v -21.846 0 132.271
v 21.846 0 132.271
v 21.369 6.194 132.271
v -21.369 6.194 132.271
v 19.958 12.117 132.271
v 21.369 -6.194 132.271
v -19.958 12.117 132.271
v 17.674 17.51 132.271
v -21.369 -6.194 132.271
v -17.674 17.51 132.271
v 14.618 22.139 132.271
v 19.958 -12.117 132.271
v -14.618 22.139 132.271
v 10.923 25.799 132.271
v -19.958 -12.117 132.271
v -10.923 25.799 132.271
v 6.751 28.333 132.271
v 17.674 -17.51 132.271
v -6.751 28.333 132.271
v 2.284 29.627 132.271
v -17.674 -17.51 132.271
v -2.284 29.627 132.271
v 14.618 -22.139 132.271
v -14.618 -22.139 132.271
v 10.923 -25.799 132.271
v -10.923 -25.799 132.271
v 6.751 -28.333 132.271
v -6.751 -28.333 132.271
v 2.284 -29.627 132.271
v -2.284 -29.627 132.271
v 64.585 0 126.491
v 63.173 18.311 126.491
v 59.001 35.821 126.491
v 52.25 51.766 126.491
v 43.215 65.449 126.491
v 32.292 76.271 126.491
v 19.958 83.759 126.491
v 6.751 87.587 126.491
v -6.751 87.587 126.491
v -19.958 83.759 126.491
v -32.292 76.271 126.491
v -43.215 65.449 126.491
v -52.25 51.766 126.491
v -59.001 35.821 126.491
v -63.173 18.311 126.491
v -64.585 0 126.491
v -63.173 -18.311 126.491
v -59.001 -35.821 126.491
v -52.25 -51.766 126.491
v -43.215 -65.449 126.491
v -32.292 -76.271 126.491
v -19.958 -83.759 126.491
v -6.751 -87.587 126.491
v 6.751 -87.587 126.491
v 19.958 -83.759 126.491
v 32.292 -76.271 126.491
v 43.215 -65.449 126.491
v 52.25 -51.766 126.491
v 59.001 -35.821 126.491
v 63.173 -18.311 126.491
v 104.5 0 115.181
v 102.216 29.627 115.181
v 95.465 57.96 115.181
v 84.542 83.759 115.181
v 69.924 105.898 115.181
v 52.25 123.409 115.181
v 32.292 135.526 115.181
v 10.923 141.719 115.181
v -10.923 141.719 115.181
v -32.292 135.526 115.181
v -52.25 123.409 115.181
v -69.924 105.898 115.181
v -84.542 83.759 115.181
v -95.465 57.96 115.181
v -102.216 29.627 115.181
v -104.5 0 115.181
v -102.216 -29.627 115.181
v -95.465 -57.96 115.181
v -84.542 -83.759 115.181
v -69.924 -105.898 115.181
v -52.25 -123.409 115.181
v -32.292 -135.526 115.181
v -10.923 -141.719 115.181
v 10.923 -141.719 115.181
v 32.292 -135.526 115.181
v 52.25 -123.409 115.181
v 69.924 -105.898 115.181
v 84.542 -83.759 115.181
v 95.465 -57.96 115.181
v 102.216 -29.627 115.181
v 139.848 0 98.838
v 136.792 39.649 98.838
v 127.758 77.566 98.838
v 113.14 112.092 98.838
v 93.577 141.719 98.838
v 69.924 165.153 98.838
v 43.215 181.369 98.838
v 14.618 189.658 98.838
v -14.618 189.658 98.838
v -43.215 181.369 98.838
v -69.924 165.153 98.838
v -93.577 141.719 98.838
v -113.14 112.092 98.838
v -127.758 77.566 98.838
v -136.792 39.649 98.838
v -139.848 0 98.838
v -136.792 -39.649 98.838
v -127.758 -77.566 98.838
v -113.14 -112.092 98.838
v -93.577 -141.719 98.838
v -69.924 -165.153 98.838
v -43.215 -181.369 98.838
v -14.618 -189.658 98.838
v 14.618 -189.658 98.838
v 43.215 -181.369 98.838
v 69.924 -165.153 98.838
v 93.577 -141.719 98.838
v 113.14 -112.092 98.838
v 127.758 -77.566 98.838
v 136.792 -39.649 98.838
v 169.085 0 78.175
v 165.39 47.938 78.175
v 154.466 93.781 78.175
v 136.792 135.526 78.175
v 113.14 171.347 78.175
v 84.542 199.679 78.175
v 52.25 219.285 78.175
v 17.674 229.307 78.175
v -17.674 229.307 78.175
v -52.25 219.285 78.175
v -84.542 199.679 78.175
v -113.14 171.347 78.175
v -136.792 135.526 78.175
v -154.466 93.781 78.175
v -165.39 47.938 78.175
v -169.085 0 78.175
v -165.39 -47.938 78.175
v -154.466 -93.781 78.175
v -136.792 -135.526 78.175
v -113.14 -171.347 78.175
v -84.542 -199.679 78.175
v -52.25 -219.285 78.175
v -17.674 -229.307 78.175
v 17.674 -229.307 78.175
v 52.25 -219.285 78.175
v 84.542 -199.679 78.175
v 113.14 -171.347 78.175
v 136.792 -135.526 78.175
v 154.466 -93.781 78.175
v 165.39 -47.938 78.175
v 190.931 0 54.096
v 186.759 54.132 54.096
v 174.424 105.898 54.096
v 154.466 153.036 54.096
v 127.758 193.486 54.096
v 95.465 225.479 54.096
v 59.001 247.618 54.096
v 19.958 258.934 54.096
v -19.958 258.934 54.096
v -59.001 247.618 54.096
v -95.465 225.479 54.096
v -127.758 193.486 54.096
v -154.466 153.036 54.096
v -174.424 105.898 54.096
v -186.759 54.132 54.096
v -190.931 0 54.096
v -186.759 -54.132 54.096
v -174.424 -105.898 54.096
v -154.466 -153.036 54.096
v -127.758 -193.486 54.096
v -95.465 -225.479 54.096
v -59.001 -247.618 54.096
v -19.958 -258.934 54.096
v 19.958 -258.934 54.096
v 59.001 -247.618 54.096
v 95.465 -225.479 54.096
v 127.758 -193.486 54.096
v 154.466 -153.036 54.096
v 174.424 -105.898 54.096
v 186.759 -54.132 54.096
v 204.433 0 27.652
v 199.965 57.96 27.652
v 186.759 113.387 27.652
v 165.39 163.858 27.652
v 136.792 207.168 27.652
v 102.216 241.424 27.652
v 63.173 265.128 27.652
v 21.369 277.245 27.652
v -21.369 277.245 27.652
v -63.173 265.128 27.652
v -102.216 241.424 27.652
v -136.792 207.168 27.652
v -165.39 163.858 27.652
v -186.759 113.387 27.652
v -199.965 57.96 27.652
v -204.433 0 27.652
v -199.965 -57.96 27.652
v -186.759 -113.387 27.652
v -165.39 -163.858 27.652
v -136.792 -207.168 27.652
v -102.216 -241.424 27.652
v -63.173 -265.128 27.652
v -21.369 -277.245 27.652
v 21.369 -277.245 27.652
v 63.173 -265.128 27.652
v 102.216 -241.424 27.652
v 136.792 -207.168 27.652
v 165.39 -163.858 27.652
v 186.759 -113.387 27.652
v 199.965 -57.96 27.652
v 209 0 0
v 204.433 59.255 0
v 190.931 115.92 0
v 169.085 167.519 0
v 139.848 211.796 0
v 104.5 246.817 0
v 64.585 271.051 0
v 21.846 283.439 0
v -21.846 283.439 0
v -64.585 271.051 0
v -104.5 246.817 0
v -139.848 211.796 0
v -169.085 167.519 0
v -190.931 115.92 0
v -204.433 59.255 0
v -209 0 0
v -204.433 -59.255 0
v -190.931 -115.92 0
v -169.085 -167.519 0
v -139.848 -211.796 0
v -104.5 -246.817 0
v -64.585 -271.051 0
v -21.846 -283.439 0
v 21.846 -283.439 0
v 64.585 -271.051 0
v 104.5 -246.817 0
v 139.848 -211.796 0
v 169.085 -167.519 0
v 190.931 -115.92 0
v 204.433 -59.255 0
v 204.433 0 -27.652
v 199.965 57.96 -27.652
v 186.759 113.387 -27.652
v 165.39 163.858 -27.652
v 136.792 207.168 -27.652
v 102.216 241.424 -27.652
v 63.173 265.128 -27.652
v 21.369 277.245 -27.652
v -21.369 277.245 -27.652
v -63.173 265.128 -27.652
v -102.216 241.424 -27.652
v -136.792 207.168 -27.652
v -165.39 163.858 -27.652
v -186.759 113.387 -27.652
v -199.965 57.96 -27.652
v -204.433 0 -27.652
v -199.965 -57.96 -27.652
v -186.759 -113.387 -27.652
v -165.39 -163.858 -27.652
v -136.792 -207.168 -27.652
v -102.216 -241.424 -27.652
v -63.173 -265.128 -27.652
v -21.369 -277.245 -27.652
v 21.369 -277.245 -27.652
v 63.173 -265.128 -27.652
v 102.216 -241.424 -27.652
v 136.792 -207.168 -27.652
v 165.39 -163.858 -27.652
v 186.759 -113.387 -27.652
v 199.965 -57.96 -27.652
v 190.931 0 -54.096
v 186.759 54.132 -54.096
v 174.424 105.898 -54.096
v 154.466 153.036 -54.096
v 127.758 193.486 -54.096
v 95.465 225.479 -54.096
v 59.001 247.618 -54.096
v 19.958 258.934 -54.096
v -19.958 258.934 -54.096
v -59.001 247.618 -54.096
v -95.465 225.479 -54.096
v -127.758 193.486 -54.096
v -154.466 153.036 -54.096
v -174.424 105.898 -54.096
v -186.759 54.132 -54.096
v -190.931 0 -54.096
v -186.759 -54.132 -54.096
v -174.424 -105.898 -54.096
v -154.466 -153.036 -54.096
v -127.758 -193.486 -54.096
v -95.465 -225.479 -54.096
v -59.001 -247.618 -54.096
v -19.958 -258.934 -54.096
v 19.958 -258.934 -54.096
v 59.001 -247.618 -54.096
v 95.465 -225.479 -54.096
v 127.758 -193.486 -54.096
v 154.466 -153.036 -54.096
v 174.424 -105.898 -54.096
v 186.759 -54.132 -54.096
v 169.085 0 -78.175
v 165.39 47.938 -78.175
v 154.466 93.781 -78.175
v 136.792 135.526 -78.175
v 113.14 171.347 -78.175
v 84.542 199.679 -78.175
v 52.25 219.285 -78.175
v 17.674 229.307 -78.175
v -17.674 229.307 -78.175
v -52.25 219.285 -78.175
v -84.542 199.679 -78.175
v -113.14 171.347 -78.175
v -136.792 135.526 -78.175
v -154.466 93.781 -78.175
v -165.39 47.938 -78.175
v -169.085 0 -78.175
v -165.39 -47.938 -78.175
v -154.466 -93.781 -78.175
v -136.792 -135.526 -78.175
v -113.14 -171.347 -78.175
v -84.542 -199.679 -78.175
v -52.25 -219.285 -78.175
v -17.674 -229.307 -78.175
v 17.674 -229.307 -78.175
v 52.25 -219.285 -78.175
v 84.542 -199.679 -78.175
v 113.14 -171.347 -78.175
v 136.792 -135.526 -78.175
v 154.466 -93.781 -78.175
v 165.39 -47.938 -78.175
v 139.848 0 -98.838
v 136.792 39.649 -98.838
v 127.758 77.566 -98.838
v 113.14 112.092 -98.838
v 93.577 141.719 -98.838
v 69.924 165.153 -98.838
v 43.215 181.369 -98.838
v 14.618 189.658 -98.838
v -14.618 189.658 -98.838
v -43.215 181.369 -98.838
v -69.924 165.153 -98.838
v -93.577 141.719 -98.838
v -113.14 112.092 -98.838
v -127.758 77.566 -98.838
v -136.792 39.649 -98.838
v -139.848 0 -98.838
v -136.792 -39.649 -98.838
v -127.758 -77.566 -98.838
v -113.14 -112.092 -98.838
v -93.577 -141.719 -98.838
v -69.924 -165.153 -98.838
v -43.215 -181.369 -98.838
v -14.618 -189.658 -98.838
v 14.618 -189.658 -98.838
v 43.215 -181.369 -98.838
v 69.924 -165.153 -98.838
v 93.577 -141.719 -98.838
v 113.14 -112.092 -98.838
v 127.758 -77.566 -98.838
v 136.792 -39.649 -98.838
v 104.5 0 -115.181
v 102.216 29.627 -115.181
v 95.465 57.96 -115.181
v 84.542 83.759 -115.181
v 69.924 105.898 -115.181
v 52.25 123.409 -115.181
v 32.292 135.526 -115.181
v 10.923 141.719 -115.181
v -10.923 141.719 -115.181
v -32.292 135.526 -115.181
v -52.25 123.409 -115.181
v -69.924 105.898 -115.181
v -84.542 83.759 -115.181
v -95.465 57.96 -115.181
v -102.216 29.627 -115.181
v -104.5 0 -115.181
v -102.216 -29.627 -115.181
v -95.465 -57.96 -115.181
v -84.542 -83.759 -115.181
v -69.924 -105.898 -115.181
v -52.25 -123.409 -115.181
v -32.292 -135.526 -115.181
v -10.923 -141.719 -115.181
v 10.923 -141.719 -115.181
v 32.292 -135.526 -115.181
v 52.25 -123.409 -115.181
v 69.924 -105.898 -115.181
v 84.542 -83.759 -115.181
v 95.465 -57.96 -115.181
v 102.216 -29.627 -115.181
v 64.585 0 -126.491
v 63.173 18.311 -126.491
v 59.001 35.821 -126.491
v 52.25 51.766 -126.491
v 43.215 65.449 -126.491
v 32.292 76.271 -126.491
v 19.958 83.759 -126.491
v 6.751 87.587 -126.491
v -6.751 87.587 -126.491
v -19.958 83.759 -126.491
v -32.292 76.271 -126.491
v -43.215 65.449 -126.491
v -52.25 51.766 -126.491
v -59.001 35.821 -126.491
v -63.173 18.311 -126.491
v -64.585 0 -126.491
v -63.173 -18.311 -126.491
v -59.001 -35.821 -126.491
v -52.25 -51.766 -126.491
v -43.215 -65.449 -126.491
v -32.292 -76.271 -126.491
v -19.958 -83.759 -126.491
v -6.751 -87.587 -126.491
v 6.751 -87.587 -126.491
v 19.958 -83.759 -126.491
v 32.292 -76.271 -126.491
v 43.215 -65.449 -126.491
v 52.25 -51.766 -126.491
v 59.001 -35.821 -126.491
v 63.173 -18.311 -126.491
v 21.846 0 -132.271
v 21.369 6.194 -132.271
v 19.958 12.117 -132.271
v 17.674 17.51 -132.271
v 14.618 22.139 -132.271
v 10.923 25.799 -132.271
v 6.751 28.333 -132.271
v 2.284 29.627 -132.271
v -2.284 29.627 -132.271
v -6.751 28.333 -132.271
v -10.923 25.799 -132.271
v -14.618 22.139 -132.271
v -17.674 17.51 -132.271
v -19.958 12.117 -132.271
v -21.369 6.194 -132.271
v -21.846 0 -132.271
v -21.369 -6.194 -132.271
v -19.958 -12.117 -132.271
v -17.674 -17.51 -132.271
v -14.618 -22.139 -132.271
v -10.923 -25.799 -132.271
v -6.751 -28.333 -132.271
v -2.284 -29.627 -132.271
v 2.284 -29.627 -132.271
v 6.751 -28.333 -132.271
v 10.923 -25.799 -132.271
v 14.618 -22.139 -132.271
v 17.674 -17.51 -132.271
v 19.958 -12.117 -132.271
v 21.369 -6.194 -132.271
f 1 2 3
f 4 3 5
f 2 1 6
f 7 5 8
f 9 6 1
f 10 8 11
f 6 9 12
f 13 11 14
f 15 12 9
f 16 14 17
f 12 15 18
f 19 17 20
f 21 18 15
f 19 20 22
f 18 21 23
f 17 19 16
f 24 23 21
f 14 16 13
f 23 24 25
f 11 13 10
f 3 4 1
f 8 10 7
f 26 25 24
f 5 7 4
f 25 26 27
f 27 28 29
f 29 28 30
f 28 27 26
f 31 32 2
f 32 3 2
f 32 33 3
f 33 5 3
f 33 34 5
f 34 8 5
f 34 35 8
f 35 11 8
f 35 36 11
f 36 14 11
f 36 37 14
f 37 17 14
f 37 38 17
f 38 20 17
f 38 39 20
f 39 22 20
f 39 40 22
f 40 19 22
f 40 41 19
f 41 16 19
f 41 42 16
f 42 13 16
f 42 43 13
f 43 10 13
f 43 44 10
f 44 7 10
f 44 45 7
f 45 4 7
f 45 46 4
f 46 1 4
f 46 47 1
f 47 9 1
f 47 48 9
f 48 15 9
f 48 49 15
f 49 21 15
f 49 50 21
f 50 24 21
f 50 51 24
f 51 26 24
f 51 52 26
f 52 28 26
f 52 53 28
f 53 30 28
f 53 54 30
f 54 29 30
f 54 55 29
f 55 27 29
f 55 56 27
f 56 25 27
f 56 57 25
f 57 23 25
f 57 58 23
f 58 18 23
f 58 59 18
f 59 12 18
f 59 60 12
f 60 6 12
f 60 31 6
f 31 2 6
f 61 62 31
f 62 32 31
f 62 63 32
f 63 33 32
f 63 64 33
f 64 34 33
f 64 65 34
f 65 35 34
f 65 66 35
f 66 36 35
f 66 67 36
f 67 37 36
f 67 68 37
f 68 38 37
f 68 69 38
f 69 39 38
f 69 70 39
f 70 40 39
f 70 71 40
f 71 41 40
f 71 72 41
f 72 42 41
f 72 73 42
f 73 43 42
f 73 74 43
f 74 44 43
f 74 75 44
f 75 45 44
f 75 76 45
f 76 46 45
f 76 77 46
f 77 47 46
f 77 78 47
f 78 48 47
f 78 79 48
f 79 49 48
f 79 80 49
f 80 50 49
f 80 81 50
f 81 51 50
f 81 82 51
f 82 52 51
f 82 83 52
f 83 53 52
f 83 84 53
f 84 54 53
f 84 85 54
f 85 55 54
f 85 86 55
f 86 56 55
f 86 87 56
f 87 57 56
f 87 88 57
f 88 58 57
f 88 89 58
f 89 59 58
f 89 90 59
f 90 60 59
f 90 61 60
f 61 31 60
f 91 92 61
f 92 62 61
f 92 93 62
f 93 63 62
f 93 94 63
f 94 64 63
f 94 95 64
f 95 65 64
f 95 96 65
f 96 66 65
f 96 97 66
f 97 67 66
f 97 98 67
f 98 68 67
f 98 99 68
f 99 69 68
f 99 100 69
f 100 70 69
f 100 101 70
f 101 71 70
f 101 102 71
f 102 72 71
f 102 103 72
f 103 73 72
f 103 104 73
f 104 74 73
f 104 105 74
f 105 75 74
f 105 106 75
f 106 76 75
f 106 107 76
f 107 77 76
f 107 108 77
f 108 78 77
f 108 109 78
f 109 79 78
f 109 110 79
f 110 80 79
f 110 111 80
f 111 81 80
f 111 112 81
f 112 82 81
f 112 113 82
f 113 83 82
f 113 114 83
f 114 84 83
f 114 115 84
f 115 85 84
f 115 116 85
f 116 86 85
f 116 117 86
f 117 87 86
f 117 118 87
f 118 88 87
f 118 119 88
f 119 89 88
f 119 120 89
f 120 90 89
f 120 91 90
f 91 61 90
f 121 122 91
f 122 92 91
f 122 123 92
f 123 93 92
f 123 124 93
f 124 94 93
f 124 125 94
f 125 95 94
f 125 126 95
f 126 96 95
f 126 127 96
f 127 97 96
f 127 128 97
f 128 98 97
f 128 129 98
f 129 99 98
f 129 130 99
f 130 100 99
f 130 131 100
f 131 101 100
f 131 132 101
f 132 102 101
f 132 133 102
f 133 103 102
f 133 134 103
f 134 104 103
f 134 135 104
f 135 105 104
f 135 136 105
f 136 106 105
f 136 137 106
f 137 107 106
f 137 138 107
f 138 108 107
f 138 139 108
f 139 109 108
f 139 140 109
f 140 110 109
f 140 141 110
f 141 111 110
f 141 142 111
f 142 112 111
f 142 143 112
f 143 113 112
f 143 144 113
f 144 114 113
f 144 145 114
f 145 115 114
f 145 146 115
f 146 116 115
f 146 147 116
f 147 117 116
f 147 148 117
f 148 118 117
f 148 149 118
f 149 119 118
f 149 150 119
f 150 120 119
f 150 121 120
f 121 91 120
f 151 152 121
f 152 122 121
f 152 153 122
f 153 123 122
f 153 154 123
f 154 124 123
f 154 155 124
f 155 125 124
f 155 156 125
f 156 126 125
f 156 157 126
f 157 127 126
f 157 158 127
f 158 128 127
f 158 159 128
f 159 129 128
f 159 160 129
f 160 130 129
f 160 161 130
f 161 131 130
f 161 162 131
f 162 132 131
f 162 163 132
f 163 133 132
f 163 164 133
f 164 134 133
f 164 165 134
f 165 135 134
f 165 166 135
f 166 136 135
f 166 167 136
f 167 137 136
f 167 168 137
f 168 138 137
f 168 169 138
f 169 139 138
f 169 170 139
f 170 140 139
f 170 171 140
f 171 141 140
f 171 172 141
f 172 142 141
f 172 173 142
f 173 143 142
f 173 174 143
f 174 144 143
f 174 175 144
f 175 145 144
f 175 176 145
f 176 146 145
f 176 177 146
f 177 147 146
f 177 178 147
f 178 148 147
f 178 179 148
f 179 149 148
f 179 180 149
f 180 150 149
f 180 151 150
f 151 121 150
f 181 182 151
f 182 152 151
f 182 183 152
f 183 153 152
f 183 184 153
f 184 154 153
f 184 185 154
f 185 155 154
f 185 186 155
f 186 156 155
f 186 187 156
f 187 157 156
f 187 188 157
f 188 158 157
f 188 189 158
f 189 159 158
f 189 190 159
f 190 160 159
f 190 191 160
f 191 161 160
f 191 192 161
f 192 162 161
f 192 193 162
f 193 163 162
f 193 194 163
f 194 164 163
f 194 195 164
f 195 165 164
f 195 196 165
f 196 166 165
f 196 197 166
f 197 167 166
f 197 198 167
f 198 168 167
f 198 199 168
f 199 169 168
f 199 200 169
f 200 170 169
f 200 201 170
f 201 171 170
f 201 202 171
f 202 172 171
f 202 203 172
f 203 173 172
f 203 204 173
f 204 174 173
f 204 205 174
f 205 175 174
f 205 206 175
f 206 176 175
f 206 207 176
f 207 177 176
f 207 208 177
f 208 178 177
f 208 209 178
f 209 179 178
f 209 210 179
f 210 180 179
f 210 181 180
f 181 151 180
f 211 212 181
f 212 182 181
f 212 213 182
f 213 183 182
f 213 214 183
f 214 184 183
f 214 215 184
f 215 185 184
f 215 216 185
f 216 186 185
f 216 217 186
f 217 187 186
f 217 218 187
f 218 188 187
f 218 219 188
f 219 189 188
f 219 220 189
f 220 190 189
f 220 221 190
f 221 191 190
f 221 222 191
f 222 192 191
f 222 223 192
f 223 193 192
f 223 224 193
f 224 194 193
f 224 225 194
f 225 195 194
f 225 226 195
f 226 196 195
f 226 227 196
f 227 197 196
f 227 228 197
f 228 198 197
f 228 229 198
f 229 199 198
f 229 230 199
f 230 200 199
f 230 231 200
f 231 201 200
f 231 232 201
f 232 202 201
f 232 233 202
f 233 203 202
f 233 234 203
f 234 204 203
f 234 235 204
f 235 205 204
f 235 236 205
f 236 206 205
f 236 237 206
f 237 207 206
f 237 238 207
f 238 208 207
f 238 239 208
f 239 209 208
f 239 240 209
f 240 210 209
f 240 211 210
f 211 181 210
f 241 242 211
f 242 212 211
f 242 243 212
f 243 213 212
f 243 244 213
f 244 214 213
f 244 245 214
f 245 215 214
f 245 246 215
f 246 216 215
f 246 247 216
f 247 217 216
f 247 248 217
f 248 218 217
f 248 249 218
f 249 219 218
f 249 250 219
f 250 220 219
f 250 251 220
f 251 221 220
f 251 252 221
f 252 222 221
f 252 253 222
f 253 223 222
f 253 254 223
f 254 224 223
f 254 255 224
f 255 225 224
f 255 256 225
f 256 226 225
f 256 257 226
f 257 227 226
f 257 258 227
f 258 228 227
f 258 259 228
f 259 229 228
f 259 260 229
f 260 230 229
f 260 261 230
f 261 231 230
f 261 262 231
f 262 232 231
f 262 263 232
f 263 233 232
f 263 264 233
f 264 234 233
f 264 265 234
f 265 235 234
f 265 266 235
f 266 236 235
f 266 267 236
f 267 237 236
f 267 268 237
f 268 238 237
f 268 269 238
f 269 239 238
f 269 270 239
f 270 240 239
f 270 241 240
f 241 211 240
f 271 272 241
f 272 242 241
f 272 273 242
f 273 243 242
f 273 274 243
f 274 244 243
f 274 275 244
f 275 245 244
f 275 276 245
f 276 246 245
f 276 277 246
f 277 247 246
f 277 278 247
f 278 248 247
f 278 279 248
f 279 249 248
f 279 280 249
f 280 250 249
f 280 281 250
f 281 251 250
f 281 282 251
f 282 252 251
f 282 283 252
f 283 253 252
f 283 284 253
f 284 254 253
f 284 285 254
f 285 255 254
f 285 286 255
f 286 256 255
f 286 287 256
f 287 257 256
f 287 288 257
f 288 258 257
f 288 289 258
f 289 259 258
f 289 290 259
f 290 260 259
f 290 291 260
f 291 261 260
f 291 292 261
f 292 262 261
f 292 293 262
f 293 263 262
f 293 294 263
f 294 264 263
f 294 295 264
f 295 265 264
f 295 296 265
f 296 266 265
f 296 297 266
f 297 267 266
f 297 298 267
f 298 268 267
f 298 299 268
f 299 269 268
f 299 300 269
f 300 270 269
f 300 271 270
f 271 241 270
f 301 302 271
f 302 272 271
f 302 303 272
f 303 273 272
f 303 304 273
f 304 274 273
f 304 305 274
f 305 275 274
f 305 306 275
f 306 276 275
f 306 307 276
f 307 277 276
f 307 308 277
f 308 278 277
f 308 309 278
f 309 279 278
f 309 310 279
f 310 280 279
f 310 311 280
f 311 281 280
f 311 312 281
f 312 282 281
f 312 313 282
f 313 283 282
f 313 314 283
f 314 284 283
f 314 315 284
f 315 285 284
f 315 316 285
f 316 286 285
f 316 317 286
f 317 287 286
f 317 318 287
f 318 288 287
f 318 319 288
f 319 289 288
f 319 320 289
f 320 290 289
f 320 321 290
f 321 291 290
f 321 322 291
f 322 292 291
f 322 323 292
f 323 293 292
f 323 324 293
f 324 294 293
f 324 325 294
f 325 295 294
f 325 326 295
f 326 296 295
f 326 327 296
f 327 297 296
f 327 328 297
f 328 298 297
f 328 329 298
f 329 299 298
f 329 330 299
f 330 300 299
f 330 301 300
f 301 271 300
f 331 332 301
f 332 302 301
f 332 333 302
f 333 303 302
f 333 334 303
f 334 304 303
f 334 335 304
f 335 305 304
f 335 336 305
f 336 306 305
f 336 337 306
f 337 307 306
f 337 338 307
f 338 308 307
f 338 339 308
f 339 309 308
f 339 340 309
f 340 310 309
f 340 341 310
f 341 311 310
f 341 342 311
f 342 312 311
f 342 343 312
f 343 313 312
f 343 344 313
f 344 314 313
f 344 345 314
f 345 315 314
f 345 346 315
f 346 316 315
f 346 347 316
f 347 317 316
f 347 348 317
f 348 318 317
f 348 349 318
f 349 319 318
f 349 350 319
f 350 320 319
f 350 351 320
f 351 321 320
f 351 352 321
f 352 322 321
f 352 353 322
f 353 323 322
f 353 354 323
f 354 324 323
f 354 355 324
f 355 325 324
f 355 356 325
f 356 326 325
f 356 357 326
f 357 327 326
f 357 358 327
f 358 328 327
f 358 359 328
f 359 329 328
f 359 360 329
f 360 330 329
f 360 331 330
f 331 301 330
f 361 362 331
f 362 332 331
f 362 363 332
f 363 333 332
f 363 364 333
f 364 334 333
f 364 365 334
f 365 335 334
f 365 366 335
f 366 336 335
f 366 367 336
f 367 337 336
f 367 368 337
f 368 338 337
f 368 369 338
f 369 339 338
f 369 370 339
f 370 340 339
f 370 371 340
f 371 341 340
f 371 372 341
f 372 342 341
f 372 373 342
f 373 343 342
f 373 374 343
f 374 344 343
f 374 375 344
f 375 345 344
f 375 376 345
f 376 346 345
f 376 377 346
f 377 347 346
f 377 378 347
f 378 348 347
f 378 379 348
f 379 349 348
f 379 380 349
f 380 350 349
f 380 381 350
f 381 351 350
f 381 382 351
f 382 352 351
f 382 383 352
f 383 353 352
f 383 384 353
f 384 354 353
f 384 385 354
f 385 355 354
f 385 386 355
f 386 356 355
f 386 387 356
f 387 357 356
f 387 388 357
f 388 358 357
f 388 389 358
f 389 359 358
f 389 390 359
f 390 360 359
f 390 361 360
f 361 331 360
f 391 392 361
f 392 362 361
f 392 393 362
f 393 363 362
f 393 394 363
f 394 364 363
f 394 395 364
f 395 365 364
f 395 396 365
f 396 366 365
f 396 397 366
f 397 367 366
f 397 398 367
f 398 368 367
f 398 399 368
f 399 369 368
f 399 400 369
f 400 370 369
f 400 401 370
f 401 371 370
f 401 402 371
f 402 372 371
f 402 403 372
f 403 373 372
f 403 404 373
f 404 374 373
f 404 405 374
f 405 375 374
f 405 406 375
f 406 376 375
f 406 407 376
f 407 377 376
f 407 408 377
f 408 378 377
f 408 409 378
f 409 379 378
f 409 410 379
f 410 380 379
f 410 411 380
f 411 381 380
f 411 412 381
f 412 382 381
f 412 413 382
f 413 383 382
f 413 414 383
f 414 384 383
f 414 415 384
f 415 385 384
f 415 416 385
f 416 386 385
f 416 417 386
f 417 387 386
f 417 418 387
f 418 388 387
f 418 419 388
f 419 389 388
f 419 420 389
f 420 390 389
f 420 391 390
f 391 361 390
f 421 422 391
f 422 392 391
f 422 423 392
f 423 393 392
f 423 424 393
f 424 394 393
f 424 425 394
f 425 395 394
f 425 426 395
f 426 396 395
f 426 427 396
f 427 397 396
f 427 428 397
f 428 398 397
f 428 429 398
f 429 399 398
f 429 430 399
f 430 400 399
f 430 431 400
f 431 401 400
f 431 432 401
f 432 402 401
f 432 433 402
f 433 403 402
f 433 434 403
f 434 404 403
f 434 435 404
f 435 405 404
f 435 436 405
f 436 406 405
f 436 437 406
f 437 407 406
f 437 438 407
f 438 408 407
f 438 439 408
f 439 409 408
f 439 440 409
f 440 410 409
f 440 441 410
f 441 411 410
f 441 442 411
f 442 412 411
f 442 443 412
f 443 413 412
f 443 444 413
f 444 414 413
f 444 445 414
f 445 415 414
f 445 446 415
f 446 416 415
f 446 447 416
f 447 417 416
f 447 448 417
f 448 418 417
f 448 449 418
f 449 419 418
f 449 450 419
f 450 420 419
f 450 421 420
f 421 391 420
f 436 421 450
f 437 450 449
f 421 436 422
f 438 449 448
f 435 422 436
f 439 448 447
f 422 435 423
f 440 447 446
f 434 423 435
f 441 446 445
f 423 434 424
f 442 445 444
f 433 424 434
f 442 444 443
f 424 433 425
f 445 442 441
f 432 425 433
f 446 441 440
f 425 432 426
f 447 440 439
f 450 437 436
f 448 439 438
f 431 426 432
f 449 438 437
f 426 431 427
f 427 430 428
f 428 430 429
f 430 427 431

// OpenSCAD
// Generated by SolidPython 1.0.1 on 2020-07-29 00:46:50


scale(v = [11, 15, 7]) {
	sphere(r = 19);
}
/***********************************************
*********      SolidPython code:      **********
************************************************
 
# import packages: SolidPython
from solid import *
from solid.utils import *
from itertools import chain, combinations, permutations


class Resize:

    def __init__(self, scad_file):
        self.scad_file = scad_file
        #self.scad_file = import_scad(scad_file)
        # cone/cylinder param:
        self.r1 = 0
        self.r2 = 0
        self.h = 0
        # rectangular prism param:
        self.w = 0
        self.l = 0
        # ellipse param:
        self.r = 0

    # import OpenScad code (file name corresponds to shape)


    # classify shape + parameters
    def assign(self, param1, param2, param3):
        if self.scad_file == 'cone.scad':
            self.r1 = param1
            self.r2 = param2
            self.h = param3
        elif self.scad_file == 'cylinder.scad':
            self.r1 = param1
            self.r2 = param2
            self.h = param3
        elif self.scad_file == 'rectangularPrism.scad':
            self.h = param1
            self.l = param2
            self.w = param3
        else:
            self.r = param1
            self.h = param2

    # resize parameters
    def iterate(self):
        x = range(3, 20, 2)
        i = 1
        if self.scad_file == 'cone.scad':
            tempList = list(permutations(x, 2))
            for temp in tempList:
                param1 = temp[0]
                param2 = temp[1]
                filepath = 'produced_scad_files/' + 'cone' + str(param1) + '_' + str(param2) + '_' + '.scad'
                scad_render_to_file(cylinder(h=param1, r1=param2, r2=0), filepath)

        elif self.scad_file == 'cylinder.scad':
            tempList = list(permutations(x, 3))
            for temp in tempList:
                param1 = temp[0]
                param2 = temp[1]
                filepath = 'produced_scad_files/' + 'cylinder' + str(param1) + '_' + str(param2) + '_' + '.scad'
                scad_render_to_file(cylinder(h=param1, r1=param2, r2=param2), filepath)

        elif self.scad_file == 'rectangularPrism.scad':
            tempList = list(permutations(x, 3))
            for temp in tempList:
                param1 = temp[0]
                param2 = temp[1]
                param3 = temp[2]
                filepath = 'produced_scad_files/' + 'rectangularPrism' + str(param1) + '_' + str(param2) + '_' + str(
                    param3) + '.scad'
                scad_render_to_file(cube(size=(param1, param2, param3)), filepath)

        elif self.scad_file == 'ellipse.scad':
            tempList = list(permutations(x, 4))
            for temp in tempList:
                param1 = temp[0]
                param2 = temp[1]
                param3 = temp[2]
                param4 = temp[3]
                filepath = 'produced_scad_files/' + 'ellipse' + str(param1) + '_' + str(param2) + '_' + str(param3) + '_' + str(param4) + '.scad'
                scad_render_to_file(scale([param1, param2, param3])(sphere(r=param4)), filepath)

    def render_to_scadfile(self):
        scad_render_to_file(scad, 'example.scad') 
 
************************************************/
